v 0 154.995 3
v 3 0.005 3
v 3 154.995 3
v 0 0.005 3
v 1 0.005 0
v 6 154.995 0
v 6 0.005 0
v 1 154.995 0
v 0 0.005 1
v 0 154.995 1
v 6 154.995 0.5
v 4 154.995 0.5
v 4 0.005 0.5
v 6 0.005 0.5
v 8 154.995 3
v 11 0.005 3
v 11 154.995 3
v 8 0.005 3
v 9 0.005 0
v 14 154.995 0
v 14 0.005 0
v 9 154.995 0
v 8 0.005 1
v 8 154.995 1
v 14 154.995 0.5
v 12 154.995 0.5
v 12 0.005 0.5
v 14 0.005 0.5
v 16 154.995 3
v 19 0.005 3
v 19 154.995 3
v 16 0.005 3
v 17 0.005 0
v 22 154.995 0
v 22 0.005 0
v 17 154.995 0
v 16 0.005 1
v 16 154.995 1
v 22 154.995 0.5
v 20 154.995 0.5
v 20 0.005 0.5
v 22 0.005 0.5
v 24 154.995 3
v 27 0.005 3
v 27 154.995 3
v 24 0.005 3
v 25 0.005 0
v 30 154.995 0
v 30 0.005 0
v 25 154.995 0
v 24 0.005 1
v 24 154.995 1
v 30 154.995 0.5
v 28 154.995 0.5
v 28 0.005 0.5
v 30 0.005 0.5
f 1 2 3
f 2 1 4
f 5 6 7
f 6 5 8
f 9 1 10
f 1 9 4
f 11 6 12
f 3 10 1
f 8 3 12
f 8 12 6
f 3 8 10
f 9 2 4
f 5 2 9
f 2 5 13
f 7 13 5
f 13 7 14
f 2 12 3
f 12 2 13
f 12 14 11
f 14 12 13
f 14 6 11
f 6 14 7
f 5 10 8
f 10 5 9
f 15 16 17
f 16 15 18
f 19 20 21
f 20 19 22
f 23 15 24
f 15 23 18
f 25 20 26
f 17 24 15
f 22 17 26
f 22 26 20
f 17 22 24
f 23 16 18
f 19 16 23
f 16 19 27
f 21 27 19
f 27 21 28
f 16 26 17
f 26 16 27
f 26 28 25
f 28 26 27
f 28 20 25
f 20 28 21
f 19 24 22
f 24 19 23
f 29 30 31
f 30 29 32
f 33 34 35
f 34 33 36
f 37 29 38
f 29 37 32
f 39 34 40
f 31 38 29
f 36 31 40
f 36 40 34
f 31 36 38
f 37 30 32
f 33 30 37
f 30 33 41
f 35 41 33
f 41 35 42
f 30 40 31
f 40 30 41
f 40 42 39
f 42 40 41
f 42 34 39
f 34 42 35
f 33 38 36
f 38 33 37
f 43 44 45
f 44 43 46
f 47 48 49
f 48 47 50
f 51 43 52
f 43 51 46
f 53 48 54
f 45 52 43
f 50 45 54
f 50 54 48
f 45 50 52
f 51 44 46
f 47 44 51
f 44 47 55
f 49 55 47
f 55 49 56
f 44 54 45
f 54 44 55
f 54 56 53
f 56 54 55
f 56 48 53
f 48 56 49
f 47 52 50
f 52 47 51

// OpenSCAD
FRAME_THICKNESS =   8/2; // to 9

ATOM = 0.01;

HOLE_POSITION = 20+4;
HOLE_DIAMETER = 3;
GUIDE_SIZE = HOLE_POSITION + 3; //28 +4;
HEIGHT = 3;

LENGTH = 155;

THICKNESS = .5;
CHAMFER = 1;

$fn= 90;

module piece() {
    intersection() {
        difference() {
            translate([0, ATOM/2, 0])
            cube([GUIDE_SIZE, LENGTH-ATOM, HEIGHT]);

            hull() {
                translate([FRAME_THICKNESS, 0, THICKNESS])
                cube([GUIDE_SIZE, LENGTH, HEIGHT]);

                translate([FRAME_THICKNESS-HEIGHT/3, 0, HEIGHT])
                cube([GUIDE_SIZE, LENGTH, HEIGHT]);
            }

            translate([FRAME_THICKNESS+2, 0, -ATOM])
            cube([GUIDE_SIZE, LENGTH, HEIGHT]);
        }

        hull() {
            translate([0, 0, CHAMFER])
            cube([GUIDE_SIZE+CHAMFER, LENGTH, HEIGHT]);
            translate([CHAMFER, 0, 0])
            cube([GUIDE_SIZE, LENGTH, HEIGHT]);
        }
    }
}

for (x=[0:3])
    translate([x*FRAME_THICKNESS*2 , 0, 0])
    piece();
